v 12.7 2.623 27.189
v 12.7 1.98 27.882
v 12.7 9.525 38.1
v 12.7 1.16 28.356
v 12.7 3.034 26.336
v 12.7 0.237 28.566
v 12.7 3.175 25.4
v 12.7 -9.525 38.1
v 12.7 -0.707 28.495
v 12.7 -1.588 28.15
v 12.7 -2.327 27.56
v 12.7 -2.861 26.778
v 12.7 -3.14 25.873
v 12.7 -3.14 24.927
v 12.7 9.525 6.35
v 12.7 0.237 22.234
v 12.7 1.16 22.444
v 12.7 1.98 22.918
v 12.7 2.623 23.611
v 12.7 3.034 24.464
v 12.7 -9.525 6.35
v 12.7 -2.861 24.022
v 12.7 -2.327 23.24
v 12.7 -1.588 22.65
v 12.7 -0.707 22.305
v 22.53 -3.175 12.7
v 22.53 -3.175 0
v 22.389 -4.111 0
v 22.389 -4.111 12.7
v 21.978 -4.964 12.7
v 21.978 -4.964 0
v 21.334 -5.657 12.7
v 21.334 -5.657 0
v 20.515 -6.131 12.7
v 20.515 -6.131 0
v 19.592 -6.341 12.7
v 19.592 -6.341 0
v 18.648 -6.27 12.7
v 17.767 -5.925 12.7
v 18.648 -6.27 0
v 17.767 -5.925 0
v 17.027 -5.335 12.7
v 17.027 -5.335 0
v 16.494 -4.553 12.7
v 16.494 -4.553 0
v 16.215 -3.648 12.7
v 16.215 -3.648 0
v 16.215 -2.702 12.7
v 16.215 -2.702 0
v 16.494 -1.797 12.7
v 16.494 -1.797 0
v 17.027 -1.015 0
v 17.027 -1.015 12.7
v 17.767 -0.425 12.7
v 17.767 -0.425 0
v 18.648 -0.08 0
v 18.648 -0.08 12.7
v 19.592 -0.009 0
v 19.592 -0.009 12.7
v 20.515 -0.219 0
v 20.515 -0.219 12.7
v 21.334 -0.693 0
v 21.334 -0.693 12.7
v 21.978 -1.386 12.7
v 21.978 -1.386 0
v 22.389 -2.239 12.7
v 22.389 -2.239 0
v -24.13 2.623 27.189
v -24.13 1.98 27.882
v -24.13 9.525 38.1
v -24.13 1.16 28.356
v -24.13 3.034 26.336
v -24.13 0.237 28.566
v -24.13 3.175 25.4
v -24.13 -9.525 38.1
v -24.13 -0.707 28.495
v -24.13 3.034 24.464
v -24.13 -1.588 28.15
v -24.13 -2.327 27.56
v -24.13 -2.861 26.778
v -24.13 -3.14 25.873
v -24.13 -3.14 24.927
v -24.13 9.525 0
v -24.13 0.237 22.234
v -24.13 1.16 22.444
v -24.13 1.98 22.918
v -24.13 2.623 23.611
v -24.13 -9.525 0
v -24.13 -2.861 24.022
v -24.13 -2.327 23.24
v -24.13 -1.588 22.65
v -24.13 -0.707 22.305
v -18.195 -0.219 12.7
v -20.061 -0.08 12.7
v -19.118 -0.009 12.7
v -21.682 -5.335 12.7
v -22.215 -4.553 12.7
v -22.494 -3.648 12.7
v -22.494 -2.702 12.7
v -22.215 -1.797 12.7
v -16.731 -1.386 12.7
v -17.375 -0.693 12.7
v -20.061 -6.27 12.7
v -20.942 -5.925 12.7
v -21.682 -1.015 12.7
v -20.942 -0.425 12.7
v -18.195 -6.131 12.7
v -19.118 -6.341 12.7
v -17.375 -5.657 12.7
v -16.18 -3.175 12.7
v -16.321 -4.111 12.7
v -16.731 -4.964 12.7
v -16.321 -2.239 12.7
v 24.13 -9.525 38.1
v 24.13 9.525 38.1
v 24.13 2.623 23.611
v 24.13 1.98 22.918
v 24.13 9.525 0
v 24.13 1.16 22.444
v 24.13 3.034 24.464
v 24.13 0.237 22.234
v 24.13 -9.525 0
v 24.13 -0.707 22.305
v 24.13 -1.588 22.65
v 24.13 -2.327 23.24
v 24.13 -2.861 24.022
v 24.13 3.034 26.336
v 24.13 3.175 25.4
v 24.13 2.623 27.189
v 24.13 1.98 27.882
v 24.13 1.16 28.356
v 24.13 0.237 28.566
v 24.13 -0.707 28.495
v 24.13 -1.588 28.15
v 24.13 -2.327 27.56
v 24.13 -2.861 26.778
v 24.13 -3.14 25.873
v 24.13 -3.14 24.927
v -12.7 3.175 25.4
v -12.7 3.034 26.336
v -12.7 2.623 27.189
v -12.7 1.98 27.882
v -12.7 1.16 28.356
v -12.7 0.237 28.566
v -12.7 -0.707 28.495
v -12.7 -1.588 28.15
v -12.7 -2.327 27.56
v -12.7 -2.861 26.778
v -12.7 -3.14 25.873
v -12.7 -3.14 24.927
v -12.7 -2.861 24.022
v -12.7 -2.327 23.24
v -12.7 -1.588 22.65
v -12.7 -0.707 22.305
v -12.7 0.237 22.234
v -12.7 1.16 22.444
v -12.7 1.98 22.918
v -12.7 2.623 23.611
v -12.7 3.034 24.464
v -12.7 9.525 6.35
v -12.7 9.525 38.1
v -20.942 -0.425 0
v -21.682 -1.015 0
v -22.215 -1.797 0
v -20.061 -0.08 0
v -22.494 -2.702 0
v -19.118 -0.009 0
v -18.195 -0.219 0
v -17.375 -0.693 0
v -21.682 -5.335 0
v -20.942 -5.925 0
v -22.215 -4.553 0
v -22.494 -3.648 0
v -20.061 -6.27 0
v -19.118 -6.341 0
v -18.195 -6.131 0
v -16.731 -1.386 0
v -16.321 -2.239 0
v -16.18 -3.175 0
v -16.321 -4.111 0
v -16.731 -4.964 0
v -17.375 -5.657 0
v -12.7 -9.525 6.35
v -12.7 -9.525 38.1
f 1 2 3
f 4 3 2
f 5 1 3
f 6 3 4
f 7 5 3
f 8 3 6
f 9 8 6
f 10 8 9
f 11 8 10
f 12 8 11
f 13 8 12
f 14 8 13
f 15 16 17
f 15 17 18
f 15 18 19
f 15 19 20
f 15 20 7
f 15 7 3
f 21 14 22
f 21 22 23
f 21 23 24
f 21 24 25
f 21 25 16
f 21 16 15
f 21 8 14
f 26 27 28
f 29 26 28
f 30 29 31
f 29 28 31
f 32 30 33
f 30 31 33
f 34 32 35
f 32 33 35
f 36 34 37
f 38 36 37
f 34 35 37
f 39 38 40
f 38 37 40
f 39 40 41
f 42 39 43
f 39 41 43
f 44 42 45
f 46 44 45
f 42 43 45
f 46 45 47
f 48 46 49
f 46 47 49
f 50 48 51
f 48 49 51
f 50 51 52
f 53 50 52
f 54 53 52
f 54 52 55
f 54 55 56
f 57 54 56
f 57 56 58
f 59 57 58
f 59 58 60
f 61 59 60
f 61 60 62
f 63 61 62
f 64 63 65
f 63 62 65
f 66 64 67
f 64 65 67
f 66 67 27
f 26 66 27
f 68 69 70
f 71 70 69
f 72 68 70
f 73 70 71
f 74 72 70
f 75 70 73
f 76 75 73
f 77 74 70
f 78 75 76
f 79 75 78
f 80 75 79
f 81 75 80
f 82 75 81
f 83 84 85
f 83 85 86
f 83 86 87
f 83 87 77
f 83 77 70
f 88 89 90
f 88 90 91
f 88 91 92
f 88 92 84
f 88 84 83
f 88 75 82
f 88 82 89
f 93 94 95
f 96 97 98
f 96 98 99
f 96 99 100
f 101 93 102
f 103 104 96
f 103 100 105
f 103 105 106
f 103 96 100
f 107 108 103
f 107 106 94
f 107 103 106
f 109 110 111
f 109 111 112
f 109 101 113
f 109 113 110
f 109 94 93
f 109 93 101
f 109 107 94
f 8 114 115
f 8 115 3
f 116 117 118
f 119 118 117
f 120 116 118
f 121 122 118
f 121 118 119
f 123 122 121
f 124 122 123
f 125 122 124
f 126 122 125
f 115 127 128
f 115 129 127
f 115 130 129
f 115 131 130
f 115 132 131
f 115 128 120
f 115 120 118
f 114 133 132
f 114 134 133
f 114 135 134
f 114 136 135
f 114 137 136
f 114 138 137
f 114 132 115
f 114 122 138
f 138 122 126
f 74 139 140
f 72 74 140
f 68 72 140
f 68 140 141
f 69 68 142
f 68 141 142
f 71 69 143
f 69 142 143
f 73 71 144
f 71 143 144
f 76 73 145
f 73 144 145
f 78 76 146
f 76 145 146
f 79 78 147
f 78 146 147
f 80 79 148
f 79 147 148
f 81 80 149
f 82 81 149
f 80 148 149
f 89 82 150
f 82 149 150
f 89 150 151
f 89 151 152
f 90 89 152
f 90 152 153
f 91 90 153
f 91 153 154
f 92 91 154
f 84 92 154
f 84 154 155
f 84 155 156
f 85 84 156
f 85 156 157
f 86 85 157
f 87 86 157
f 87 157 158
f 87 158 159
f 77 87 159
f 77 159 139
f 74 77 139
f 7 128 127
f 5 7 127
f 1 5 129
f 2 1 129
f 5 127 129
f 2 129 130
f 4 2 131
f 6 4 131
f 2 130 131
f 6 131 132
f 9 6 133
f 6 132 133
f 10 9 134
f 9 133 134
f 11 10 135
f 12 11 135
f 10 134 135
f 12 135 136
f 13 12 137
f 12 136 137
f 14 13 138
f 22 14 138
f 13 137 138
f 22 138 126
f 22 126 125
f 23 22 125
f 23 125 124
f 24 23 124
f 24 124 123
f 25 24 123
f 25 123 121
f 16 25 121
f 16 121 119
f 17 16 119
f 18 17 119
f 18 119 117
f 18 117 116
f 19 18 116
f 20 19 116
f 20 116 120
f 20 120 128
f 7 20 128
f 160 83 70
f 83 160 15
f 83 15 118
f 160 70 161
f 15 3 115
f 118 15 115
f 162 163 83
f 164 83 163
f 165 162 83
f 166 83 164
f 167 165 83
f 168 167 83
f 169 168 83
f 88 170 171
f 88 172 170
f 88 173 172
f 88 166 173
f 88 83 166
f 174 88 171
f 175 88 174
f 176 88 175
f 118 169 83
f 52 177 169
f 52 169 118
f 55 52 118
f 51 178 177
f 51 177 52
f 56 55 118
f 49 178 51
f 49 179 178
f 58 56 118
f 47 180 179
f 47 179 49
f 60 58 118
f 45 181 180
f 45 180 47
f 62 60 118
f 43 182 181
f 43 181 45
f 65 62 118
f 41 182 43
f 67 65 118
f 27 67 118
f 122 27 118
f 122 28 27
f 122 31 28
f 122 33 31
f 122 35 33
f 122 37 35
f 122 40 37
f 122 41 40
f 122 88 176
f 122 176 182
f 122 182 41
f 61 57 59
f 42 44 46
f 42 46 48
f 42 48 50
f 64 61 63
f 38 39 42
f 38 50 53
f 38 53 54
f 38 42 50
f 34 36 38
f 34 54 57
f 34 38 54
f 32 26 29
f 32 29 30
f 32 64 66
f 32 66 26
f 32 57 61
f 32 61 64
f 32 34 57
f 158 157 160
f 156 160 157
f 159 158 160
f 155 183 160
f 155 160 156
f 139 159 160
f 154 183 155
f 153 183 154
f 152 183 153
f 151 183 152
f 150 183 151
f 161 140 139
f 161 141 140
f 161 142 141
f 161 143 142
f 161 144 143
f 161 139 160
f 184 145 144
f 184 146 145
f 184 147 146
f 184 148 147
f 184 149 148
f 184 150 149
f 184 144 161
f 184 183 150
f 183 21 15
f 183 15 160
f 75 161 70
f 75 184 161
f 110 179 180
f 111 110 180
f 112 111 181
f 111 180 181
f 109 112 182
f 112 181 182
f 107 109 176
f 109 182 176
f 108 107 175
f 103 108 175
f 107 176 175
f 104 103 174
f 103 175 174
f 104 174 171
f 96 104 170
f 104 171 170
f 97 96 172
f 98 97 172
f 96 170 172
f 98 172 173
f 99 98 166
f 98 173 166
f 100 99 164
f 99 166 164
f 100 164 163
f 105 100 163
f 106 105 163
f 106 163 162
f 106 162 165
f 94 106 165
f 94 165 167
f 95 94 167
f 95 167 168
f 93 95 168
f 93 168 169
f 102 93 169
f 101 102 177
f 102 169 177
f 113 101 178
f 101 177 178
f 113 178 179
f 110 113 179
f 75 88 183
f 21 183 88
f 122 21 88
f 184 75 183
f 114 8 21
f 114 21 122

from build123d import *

# Parameters (mm, degrees)
F1_DEPTH = 9.525
F2_R     = 3.175
F3_DEPTH = 59.182
F4_R     = 3.175
F5_DEPTH = 12.7


with BuildPart() as f1:
    # F0 (on Front) → F1 (new body, symmetric)
    with BuildSketch(Plane.XZ):
        Polygon((-24.13, 0), (0, 0), (24.13, 0), (24.13, 38.1), (12.7, 38.1), (12.7, 6.35), (0, 6.35), (-12.7, 6.35), (-12.7, 38.1), (-24.13, 38.1), align=None)
    extrude(amount=F1_DEPTH, both=True)

    # F2 (on face) → F3 (cut)
    with BuildSketch(Plane.YZ.offset(24.13)):
        with Locations((0, 25.4)):
            Circle(F2_R)
    extrude(amount=-F3_DEPTH, mode=Mode.SUBTRACT)

    # F4 (on face) → F5 (cut)
    with BuildSketch(Plane(origin=(0, 0, 0), x_dir=(1, 0, 0), z_dir=(0, 0, -1))):
        with Locations((-19.3548, 3.175)):
            Circle(F4_R)
        with Locations((19.3548, 3.175)):
            Circle(F4_R)
    extrude(amount=-F5_DEPTH, mode=Mode.SUBTRACT)


solid = f1.part
